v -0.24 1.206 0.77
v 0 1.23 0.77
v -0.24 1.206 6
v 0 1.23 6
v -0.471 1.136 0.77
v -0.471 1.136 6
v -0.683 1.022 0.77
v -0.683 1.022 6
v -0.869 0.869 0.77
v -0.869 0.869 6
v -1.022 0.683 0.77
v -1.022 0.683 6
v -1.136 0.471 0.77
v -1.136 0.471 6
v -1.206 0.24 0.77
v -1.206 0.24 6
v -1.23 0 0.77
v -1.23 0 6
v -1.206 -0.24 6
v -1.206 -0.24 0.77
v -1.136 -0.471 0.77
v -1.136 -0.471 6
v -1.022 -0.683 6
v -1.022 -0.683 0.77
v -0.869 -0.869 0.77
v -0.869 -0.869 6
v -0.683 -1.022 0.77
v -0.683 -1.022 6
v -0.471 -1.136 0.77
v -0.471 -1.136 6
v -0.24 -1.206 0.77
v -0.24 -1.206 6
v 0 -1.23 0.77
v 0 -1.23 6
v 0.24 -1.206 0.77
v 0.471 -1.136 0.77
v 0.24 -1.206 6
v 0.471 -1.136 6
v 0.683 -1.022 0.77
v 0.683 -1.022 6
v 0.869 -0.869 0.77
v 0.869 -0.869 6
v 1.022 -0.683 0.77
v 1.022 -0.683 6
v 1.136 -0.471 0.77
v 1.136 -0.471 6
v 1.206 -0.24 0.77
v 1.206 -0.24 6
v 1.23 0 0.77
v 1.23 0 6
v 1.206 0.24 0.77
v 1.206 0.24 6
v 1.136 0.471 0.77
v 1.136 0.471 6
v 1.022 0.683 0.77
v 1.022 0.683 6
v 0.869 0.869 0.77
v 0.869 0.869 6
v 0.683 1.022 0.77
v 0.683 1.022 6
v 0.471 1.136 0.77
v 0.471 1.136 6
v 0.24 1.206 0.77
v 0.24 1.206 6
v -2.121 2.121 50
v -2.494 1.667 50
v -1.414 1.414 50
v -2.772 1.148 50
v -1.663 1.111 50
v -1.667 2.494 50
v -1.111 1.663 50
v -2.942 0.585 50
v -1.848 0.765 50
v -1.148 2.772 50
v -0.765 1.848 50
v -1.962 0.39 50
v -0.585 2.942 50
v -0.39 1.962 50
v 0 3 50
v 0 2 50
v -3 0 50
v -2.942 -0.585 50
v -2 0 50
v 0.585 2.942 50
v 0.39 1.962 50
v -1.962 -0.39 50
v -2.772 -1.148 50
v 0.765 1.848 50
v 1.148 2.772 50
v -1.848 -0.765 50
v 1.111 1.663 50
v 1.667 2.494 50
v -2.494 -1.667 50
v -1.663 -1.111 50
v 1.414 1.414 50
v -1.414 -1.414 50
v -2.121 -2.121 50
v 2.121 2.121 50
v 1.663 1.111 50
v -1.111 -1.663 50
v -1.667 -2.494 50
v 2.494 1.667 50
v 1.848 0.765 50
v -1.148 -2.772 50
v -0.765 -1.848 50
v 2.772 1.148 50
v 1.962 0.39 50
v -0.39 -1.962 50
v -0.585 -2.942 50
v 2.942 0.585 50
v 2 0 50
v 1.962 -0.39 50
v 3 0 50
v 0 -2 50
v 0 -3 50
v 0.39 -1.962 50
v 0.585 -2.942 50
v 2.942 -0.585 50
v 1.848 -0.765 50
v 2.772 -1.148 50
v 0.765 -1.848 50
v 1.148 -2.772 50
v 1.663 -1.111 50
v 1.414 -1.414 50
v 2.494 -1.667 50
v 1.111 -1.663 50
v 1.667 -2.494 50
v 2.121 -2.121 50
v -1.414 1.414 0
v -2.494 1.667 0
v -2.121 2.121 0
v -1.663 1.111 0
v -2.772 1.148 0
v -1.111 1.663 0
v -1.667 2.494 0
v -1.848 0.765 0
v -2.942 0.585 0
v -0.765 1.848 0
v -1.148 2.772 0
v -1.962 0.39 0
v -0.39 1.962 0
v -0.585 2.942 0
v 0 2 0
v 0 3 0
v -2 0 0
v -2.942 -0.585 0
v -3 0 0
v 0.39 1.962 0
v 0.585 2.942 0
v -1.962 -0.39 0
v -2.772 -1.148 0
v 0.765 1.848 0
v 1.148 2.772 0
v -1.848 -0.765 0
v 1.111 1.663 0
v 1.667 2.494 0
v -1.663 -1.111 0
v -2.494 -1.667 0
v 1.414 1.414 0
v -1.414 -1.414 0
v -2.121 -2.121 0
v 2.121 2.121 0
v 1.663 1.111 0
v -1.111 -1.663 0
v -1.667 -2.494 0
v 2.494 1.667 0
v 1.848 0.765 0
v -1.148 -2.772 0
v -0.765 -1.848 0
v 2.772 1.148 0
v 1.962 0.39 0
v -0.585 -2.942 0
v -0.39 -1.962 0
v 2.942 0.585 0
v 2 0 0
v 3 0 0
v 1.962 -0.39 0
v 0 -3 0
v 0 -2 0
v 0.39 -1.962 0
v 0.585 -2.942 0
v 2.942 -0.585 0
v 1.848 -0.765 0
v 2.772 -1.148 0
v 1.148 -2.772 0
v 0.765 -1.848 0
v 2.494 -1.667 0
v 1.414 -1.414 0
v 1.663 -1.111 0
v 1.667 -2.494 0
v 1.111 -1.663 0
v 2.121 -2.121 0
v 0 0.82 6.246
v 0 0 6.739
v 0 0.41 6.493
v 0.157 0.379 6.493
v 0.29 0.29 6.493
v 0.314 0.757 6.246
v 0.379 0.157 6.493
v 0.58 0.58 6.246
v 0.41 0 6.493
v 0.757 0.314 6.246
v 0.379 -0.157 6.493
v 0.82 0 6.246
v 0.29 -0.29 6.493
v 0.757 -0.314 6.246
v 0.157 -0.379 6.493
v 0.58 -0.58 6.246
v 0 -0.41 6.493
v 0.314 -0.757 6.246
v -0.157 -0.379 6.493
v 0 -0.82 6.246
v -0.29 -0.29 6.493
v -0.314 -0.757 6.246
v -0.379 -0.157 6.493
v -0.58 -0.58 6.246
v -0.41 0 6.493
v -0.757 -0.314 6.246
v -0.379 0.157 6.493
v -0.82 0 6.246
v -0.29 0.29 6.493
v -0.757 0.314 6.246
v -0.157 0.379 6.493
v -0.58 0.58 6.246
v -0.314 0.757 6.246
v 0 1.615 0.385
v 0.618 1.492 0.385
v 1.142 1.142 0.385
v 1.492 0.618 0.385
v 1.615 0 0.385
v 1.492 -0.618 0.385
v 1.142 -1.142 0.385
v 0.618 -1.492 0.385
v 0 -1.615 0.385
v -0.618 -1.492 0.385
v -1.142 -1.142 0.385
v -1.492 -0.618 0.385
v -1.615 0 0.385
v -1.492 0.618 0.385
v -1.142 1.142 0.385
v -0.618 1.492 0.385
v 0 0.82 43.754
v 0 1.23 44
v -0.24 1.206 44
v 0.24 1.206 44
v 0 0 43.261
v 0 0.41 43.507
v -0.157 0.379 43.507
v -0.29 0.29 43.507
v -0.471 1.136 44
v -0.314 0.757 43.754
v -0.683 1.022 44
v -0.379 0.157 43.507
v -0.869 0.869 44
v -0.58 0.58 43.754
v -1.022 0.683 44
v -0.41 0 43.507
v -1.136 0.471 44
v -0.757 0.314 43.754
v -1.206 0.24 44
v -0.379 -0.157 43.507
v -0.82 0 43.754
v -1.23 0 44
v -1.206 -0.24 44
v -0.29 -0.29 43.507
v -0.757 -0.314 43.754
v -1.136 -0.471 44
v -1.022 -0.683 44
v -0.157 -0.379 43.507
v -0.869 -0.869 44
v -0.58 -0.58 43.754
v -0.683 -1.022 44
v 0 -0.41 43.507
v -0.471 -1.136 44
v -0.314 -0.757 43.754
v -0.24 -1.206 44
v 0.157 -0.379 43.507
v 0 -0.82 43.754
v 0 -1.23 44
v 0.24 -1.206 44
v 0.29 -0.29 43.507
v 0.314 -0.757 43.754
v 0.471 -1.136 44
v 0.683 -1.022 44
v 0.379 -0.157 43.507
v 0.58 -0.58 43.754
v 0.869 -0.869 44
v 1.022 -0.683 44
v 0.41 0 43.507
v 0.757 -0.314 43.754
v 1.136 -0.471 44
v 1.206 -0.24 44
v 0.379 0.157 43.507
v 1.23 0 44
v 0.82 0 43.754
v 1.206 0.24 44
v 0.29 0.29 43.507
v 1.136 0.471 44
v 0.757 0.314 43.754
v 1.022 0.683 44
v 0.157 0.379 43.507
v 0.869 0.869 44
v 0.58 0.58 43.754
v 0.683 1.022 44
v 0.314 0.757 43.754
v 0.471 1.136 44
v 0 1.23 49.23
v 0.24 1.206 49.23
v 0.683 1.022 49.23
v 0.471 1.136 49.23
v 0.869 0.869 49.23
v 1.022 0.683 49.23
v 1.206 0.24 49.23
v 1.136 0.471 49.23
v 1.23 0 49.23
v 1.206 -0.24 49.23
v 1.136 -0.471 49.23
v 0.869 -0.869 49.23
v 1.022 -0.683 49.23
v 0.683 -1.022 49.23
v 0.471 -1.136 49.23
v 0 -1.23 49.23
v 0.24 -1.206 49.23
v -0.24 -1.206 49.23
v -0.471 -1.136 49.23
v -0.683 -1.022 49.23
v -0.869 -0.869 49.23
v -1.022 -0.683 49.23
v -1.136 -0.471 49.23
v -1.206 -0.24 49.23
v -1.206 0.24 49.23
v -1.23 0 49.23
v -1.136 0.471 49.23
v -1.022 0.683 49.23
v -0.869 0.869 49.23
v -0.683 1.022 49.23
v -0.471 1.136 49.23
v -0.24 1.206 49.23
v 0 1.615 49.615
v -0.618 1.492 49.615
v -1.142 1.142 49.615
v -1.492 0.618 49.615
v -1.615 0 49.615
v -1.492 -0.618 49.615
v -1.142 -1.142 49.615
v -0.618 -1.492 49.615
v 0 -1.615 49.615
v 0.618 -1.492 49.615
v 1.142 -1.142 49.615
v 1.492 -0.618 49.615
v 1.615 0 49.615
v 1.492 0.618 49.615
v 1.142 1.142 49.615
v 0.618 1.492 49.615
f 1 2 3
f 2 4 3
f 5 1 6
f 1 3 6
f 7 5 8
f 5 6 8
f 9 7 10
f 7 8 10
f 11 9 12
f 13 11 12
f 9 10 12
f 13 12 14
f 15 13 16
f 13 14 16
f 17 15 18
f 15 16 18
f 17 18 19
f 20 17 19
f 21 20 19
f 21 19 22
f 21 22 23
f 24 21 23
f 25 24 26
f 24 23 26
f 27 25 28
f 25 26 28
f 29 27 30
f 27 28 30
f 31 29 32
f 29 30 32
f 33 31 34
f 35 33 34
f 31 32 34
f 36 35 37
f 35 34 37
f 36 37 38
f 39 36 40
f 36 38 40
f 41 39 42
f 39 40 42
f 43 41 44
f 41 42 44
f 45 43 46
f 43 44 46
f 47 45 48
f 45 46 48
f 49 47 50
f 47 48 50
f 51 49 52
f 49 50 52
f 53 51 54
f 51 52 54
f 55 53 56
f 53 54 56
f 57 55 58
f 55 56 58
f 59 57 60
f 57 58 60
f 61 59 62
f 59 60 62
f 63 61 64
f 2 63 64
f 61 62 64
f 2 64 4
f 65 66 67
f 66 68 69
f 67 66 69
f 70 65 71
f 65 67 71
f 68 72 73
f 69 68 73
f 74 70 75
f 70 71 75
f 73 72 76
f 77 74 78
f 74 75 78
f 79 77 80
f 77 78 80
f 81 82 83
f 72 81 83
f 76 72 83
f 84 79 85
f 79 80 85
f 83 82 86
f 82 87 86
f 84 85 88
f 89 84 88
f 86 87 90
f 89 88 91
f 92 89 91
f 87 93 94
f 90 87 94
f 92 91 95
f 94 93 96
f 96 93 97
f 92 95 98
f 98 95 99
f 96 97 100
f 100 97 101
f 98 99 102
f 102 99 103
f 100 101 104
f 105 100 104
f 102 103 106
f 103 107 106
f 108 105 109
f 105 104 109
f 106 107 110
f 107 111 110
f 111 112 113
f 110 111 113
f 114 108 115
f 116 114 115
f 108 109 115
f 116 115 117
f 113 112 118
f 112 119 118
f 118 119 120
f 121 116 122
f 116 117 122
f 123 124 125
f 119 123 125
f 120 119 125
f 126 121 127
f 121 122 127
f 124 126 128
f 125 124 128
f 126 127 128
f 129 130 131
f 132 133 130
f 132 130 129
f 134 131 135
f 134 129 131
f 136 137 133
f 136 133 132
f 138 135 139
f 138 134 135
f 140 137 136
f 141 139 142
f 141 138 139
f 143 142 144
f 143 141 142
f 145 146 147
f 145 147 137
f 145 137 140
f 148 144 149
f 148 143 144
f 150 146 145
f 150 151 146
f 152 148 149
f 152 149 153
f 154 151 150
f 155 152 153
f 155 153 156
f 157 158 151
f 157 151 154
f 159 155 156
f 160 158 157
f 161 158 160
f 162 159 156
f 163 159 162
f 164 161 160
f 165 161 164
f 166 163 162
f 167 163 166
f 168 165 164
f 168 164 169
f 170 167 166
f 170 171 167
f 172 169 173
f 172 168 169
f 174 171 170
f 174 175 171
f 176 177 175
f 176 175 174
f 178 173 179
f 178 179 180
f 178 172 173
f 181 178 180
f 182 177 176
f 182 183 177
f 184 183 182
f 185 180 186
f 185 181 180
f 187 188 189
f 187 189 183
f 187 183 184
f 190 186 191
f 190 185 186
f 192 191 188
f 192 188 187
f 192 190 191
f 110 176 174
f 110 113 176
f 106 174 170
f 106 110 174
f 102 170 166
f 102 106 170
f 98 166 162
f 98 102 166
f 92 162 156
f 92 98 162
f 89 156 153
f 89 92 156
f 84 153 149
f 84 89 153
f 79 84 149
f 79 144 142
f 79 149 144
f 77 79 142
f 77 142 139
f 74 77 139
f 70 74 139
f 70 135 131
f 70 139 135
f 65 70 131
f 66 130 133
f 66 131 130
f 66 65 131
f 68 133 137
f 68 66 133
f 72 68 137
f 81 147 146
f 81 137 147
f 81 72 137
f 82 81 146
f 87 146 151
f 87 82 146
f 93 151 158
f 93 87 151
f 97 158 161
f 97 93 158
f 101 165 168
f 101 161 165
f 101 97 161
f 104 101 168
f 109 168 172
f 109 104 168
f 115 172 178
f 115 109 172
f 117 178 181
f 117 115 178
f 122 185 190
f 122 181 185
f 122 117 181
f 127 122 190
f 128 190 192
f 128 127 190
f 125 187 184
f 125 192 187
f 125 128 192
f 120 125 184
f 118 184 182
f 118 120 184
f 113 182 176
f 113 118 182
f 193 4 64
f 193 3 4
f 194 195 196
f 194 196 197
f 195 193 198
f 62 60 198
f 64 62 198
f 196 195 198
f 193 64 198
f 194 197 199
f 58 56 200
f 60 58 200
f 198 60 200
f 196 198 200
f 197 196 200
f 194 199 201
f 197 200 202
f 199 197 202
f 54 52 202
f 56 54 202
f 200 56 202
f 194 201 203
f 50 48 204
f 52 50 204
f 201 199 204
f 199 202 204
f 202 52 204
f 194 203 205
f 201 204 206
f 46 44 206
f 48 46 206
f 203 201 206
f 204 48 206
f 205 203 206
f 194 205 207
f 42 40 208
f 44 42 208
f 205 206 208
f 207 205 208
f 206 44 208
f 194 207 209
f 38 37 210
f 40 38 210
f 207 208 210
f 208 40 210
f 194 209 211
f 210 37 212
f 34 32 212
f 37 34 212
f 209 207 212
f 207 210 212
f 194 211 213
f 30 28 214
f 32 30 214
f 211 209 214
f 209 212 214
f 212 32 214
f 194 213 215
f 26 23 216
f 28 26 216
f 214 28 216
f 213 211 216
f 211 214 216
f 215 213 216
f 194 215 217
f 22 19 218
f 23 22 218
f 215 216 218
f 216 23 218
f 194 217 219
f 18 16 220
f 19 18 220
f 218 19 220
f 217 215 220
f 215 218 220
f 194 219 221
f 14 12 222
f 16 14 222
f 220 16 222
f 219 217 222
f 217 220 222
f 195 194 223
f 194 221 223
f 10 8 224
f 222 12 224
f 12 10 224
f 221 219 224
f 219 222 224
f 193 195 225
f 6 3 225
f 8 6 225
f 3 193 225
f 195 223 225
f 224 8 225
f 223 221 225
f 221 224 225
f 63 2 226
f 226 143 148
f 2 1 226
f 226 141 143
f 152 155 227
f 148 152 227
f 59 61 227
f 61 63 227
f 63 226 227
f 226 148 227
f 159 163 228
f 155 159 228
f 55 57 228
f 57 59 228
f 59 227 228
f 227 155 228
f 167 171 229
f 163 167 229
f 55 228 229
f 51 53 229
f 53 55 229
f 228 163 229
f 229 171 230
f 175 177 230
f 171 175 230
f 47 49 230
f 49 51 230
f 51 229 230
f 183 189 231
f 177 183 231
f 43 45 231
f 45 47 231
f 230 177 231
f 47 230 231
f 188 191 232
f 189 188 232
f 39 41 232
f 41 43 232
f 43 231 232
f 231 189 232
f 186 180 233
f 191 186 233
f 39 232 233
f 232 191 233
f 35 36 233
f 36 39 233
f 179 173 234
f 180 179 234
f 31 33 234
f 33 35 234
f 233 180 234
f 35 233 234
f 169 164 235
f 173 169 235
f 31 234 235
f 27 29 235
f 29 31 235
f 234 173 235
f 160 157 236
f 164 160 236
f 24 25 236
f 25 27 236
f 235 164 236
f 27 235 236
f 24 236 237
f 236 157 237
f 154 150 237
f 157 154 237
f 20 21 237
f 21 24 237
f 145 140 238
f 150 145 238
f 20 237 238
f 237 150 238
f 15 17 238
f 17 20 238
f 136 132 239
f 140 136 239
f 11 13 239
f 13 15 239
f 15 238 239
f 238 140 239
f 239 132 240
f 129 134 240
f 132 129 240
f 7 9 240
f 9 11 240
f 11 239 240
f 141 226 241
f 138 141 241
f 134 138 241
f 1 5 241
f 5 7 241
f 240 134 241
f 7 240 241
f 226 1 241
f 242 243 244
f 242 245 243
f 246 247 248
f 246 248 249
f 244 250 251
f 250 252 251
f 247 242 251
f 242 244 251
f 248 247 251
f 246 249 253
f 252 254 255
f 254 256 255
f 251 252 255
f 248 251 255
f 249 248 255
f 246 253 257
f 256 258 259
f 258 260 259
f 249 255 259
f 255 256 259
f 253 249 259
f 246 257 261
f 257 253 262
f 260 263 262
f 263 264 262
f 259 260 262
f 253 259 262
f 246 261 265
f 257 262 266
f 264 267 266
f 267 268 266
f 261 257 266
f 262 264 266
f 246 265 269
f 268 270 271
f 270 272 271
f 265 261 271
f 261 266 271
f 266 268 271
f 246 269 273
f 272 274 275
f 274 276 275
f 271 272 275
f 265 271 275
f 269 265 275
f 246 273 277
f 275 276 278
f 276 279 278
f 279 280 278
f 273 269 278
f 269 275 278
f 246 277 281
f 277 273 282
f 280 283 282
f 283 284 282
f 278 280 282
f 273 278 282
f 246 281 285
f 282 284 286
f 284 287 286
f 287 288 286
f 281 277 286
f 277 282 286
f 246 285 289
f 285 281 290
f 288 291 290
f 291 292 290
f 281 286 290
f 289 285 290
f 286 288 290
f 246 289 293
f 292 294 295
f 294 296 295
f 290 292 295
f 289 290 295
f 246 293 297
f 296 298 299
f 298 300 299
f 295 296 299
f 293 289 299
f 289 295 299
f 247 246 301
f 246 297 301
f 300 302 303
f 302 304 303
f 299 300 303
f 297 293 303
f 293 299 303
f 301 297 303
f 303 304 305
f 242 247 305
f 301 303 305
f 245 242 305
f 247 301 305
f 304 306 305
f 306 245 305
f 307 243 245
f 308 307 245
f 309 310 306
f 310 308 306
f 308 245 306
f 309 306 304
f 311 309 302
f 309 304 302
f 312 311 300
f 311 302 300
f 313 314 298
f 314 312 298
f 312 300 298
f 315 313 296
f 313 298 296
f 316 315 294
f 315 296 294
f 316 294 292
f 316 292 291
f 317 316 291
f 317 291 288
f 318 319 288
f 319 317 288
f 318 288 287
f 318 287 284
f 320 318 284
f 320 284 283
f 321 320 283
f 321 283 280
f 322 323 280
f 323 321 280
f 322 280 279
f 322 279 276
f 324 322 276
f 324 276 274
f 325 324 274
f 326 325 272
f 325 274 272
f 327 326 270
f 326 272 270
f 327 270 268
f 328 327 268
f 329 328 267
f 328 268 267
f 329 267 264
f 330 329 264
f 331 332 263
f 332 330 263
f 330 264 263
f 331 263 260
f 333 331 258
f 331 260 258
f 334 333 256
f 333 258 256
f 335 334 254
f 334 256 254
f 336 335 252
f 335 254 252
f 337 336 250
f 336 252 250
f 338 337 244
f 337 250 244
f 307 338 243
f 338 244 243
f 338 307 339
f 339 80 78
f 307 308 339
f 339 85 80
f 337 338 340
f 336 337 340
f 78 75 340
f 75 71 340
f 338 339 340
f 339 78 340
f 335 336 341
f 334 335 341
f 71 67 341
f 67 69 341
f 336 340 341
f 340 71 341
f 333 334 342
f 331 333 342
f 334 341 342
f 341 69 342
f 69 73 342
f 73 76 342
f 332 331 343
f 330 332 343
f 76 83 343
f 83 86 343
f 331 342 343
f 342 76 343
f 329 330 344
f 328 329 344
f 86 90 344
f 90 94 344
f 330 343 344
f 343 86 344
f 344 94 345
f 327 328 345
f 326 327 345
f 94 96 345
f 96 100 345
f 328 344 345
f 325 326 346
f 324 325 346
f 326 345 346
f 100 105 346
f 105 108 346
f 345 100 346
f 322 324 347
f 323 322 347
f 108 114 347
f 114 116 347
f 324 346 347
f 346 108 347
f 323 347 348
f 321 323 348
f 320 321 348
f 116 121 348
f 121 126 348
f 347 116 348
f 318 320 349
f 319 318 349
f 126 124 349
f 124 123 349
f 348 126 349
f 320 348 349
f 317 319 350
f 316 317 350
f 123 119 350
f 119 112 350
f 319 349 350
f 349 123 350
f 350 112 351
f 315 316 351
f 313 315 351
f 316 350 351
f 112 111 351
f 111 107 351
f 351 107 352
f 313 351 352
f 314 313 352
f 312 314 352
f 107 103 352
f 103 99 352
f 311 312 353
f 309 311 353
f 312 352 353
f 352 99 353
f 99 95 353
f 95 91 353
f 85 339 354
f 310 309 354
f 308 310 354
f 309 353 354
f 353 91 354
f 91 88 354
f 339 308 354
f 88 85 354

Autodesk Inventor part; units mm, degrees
ref_plane "YZ Plane" through (0, 0, 0) normal (1, 0, 0) x (0, 1, 0)
ref_plane "XZ Plane" through (0, 0, 0) normal (0, 1, 0) x (-1, 0, 0)
sketch "Sketch1" plane through (0, 0, 0) normal (0, 1, 0) x (-1, 0, 0)
  line L0 (0, 0) -> (-3, 0)
  line L1 (-3, 0) -> (-3, 50)
  line L2 (-3, 50) -> (0, 50)
  line L3 (0, 50) -> (0, 0)
  dimension "d0" = 50
  dimension "d1" = 6
revolve "Revolution1" add sketch "Sketch1" angle 360 about axis through (0, 0, 50) along (0, 0, -1)
sketch "Sketch2" plane through (0, 0, 0) normal (0, 0, -1) x (-1, 0, 0)
  point P0 (0, 0)
  point P1 (0, 0)
hole "Hole1" at (0, 0, 0) direction (0, 0, 1) diameter 2.459 depth 6 tip angle 118 countersink diameter 4 countersink angle 90 thread size "M3x0.5" class "6H" standard "ANSI Metric M Profile"
ref_plane "Work Plane1" through (0, 0, 25) normal (0, 0, -1) x (-1, 0, 0)
mirror "Mirror1" about plane through (0, 0, 25) normal (0, 0, -1) of "Hole1"
properties part number "AR-350B" material "Acetal Resin, Black"
